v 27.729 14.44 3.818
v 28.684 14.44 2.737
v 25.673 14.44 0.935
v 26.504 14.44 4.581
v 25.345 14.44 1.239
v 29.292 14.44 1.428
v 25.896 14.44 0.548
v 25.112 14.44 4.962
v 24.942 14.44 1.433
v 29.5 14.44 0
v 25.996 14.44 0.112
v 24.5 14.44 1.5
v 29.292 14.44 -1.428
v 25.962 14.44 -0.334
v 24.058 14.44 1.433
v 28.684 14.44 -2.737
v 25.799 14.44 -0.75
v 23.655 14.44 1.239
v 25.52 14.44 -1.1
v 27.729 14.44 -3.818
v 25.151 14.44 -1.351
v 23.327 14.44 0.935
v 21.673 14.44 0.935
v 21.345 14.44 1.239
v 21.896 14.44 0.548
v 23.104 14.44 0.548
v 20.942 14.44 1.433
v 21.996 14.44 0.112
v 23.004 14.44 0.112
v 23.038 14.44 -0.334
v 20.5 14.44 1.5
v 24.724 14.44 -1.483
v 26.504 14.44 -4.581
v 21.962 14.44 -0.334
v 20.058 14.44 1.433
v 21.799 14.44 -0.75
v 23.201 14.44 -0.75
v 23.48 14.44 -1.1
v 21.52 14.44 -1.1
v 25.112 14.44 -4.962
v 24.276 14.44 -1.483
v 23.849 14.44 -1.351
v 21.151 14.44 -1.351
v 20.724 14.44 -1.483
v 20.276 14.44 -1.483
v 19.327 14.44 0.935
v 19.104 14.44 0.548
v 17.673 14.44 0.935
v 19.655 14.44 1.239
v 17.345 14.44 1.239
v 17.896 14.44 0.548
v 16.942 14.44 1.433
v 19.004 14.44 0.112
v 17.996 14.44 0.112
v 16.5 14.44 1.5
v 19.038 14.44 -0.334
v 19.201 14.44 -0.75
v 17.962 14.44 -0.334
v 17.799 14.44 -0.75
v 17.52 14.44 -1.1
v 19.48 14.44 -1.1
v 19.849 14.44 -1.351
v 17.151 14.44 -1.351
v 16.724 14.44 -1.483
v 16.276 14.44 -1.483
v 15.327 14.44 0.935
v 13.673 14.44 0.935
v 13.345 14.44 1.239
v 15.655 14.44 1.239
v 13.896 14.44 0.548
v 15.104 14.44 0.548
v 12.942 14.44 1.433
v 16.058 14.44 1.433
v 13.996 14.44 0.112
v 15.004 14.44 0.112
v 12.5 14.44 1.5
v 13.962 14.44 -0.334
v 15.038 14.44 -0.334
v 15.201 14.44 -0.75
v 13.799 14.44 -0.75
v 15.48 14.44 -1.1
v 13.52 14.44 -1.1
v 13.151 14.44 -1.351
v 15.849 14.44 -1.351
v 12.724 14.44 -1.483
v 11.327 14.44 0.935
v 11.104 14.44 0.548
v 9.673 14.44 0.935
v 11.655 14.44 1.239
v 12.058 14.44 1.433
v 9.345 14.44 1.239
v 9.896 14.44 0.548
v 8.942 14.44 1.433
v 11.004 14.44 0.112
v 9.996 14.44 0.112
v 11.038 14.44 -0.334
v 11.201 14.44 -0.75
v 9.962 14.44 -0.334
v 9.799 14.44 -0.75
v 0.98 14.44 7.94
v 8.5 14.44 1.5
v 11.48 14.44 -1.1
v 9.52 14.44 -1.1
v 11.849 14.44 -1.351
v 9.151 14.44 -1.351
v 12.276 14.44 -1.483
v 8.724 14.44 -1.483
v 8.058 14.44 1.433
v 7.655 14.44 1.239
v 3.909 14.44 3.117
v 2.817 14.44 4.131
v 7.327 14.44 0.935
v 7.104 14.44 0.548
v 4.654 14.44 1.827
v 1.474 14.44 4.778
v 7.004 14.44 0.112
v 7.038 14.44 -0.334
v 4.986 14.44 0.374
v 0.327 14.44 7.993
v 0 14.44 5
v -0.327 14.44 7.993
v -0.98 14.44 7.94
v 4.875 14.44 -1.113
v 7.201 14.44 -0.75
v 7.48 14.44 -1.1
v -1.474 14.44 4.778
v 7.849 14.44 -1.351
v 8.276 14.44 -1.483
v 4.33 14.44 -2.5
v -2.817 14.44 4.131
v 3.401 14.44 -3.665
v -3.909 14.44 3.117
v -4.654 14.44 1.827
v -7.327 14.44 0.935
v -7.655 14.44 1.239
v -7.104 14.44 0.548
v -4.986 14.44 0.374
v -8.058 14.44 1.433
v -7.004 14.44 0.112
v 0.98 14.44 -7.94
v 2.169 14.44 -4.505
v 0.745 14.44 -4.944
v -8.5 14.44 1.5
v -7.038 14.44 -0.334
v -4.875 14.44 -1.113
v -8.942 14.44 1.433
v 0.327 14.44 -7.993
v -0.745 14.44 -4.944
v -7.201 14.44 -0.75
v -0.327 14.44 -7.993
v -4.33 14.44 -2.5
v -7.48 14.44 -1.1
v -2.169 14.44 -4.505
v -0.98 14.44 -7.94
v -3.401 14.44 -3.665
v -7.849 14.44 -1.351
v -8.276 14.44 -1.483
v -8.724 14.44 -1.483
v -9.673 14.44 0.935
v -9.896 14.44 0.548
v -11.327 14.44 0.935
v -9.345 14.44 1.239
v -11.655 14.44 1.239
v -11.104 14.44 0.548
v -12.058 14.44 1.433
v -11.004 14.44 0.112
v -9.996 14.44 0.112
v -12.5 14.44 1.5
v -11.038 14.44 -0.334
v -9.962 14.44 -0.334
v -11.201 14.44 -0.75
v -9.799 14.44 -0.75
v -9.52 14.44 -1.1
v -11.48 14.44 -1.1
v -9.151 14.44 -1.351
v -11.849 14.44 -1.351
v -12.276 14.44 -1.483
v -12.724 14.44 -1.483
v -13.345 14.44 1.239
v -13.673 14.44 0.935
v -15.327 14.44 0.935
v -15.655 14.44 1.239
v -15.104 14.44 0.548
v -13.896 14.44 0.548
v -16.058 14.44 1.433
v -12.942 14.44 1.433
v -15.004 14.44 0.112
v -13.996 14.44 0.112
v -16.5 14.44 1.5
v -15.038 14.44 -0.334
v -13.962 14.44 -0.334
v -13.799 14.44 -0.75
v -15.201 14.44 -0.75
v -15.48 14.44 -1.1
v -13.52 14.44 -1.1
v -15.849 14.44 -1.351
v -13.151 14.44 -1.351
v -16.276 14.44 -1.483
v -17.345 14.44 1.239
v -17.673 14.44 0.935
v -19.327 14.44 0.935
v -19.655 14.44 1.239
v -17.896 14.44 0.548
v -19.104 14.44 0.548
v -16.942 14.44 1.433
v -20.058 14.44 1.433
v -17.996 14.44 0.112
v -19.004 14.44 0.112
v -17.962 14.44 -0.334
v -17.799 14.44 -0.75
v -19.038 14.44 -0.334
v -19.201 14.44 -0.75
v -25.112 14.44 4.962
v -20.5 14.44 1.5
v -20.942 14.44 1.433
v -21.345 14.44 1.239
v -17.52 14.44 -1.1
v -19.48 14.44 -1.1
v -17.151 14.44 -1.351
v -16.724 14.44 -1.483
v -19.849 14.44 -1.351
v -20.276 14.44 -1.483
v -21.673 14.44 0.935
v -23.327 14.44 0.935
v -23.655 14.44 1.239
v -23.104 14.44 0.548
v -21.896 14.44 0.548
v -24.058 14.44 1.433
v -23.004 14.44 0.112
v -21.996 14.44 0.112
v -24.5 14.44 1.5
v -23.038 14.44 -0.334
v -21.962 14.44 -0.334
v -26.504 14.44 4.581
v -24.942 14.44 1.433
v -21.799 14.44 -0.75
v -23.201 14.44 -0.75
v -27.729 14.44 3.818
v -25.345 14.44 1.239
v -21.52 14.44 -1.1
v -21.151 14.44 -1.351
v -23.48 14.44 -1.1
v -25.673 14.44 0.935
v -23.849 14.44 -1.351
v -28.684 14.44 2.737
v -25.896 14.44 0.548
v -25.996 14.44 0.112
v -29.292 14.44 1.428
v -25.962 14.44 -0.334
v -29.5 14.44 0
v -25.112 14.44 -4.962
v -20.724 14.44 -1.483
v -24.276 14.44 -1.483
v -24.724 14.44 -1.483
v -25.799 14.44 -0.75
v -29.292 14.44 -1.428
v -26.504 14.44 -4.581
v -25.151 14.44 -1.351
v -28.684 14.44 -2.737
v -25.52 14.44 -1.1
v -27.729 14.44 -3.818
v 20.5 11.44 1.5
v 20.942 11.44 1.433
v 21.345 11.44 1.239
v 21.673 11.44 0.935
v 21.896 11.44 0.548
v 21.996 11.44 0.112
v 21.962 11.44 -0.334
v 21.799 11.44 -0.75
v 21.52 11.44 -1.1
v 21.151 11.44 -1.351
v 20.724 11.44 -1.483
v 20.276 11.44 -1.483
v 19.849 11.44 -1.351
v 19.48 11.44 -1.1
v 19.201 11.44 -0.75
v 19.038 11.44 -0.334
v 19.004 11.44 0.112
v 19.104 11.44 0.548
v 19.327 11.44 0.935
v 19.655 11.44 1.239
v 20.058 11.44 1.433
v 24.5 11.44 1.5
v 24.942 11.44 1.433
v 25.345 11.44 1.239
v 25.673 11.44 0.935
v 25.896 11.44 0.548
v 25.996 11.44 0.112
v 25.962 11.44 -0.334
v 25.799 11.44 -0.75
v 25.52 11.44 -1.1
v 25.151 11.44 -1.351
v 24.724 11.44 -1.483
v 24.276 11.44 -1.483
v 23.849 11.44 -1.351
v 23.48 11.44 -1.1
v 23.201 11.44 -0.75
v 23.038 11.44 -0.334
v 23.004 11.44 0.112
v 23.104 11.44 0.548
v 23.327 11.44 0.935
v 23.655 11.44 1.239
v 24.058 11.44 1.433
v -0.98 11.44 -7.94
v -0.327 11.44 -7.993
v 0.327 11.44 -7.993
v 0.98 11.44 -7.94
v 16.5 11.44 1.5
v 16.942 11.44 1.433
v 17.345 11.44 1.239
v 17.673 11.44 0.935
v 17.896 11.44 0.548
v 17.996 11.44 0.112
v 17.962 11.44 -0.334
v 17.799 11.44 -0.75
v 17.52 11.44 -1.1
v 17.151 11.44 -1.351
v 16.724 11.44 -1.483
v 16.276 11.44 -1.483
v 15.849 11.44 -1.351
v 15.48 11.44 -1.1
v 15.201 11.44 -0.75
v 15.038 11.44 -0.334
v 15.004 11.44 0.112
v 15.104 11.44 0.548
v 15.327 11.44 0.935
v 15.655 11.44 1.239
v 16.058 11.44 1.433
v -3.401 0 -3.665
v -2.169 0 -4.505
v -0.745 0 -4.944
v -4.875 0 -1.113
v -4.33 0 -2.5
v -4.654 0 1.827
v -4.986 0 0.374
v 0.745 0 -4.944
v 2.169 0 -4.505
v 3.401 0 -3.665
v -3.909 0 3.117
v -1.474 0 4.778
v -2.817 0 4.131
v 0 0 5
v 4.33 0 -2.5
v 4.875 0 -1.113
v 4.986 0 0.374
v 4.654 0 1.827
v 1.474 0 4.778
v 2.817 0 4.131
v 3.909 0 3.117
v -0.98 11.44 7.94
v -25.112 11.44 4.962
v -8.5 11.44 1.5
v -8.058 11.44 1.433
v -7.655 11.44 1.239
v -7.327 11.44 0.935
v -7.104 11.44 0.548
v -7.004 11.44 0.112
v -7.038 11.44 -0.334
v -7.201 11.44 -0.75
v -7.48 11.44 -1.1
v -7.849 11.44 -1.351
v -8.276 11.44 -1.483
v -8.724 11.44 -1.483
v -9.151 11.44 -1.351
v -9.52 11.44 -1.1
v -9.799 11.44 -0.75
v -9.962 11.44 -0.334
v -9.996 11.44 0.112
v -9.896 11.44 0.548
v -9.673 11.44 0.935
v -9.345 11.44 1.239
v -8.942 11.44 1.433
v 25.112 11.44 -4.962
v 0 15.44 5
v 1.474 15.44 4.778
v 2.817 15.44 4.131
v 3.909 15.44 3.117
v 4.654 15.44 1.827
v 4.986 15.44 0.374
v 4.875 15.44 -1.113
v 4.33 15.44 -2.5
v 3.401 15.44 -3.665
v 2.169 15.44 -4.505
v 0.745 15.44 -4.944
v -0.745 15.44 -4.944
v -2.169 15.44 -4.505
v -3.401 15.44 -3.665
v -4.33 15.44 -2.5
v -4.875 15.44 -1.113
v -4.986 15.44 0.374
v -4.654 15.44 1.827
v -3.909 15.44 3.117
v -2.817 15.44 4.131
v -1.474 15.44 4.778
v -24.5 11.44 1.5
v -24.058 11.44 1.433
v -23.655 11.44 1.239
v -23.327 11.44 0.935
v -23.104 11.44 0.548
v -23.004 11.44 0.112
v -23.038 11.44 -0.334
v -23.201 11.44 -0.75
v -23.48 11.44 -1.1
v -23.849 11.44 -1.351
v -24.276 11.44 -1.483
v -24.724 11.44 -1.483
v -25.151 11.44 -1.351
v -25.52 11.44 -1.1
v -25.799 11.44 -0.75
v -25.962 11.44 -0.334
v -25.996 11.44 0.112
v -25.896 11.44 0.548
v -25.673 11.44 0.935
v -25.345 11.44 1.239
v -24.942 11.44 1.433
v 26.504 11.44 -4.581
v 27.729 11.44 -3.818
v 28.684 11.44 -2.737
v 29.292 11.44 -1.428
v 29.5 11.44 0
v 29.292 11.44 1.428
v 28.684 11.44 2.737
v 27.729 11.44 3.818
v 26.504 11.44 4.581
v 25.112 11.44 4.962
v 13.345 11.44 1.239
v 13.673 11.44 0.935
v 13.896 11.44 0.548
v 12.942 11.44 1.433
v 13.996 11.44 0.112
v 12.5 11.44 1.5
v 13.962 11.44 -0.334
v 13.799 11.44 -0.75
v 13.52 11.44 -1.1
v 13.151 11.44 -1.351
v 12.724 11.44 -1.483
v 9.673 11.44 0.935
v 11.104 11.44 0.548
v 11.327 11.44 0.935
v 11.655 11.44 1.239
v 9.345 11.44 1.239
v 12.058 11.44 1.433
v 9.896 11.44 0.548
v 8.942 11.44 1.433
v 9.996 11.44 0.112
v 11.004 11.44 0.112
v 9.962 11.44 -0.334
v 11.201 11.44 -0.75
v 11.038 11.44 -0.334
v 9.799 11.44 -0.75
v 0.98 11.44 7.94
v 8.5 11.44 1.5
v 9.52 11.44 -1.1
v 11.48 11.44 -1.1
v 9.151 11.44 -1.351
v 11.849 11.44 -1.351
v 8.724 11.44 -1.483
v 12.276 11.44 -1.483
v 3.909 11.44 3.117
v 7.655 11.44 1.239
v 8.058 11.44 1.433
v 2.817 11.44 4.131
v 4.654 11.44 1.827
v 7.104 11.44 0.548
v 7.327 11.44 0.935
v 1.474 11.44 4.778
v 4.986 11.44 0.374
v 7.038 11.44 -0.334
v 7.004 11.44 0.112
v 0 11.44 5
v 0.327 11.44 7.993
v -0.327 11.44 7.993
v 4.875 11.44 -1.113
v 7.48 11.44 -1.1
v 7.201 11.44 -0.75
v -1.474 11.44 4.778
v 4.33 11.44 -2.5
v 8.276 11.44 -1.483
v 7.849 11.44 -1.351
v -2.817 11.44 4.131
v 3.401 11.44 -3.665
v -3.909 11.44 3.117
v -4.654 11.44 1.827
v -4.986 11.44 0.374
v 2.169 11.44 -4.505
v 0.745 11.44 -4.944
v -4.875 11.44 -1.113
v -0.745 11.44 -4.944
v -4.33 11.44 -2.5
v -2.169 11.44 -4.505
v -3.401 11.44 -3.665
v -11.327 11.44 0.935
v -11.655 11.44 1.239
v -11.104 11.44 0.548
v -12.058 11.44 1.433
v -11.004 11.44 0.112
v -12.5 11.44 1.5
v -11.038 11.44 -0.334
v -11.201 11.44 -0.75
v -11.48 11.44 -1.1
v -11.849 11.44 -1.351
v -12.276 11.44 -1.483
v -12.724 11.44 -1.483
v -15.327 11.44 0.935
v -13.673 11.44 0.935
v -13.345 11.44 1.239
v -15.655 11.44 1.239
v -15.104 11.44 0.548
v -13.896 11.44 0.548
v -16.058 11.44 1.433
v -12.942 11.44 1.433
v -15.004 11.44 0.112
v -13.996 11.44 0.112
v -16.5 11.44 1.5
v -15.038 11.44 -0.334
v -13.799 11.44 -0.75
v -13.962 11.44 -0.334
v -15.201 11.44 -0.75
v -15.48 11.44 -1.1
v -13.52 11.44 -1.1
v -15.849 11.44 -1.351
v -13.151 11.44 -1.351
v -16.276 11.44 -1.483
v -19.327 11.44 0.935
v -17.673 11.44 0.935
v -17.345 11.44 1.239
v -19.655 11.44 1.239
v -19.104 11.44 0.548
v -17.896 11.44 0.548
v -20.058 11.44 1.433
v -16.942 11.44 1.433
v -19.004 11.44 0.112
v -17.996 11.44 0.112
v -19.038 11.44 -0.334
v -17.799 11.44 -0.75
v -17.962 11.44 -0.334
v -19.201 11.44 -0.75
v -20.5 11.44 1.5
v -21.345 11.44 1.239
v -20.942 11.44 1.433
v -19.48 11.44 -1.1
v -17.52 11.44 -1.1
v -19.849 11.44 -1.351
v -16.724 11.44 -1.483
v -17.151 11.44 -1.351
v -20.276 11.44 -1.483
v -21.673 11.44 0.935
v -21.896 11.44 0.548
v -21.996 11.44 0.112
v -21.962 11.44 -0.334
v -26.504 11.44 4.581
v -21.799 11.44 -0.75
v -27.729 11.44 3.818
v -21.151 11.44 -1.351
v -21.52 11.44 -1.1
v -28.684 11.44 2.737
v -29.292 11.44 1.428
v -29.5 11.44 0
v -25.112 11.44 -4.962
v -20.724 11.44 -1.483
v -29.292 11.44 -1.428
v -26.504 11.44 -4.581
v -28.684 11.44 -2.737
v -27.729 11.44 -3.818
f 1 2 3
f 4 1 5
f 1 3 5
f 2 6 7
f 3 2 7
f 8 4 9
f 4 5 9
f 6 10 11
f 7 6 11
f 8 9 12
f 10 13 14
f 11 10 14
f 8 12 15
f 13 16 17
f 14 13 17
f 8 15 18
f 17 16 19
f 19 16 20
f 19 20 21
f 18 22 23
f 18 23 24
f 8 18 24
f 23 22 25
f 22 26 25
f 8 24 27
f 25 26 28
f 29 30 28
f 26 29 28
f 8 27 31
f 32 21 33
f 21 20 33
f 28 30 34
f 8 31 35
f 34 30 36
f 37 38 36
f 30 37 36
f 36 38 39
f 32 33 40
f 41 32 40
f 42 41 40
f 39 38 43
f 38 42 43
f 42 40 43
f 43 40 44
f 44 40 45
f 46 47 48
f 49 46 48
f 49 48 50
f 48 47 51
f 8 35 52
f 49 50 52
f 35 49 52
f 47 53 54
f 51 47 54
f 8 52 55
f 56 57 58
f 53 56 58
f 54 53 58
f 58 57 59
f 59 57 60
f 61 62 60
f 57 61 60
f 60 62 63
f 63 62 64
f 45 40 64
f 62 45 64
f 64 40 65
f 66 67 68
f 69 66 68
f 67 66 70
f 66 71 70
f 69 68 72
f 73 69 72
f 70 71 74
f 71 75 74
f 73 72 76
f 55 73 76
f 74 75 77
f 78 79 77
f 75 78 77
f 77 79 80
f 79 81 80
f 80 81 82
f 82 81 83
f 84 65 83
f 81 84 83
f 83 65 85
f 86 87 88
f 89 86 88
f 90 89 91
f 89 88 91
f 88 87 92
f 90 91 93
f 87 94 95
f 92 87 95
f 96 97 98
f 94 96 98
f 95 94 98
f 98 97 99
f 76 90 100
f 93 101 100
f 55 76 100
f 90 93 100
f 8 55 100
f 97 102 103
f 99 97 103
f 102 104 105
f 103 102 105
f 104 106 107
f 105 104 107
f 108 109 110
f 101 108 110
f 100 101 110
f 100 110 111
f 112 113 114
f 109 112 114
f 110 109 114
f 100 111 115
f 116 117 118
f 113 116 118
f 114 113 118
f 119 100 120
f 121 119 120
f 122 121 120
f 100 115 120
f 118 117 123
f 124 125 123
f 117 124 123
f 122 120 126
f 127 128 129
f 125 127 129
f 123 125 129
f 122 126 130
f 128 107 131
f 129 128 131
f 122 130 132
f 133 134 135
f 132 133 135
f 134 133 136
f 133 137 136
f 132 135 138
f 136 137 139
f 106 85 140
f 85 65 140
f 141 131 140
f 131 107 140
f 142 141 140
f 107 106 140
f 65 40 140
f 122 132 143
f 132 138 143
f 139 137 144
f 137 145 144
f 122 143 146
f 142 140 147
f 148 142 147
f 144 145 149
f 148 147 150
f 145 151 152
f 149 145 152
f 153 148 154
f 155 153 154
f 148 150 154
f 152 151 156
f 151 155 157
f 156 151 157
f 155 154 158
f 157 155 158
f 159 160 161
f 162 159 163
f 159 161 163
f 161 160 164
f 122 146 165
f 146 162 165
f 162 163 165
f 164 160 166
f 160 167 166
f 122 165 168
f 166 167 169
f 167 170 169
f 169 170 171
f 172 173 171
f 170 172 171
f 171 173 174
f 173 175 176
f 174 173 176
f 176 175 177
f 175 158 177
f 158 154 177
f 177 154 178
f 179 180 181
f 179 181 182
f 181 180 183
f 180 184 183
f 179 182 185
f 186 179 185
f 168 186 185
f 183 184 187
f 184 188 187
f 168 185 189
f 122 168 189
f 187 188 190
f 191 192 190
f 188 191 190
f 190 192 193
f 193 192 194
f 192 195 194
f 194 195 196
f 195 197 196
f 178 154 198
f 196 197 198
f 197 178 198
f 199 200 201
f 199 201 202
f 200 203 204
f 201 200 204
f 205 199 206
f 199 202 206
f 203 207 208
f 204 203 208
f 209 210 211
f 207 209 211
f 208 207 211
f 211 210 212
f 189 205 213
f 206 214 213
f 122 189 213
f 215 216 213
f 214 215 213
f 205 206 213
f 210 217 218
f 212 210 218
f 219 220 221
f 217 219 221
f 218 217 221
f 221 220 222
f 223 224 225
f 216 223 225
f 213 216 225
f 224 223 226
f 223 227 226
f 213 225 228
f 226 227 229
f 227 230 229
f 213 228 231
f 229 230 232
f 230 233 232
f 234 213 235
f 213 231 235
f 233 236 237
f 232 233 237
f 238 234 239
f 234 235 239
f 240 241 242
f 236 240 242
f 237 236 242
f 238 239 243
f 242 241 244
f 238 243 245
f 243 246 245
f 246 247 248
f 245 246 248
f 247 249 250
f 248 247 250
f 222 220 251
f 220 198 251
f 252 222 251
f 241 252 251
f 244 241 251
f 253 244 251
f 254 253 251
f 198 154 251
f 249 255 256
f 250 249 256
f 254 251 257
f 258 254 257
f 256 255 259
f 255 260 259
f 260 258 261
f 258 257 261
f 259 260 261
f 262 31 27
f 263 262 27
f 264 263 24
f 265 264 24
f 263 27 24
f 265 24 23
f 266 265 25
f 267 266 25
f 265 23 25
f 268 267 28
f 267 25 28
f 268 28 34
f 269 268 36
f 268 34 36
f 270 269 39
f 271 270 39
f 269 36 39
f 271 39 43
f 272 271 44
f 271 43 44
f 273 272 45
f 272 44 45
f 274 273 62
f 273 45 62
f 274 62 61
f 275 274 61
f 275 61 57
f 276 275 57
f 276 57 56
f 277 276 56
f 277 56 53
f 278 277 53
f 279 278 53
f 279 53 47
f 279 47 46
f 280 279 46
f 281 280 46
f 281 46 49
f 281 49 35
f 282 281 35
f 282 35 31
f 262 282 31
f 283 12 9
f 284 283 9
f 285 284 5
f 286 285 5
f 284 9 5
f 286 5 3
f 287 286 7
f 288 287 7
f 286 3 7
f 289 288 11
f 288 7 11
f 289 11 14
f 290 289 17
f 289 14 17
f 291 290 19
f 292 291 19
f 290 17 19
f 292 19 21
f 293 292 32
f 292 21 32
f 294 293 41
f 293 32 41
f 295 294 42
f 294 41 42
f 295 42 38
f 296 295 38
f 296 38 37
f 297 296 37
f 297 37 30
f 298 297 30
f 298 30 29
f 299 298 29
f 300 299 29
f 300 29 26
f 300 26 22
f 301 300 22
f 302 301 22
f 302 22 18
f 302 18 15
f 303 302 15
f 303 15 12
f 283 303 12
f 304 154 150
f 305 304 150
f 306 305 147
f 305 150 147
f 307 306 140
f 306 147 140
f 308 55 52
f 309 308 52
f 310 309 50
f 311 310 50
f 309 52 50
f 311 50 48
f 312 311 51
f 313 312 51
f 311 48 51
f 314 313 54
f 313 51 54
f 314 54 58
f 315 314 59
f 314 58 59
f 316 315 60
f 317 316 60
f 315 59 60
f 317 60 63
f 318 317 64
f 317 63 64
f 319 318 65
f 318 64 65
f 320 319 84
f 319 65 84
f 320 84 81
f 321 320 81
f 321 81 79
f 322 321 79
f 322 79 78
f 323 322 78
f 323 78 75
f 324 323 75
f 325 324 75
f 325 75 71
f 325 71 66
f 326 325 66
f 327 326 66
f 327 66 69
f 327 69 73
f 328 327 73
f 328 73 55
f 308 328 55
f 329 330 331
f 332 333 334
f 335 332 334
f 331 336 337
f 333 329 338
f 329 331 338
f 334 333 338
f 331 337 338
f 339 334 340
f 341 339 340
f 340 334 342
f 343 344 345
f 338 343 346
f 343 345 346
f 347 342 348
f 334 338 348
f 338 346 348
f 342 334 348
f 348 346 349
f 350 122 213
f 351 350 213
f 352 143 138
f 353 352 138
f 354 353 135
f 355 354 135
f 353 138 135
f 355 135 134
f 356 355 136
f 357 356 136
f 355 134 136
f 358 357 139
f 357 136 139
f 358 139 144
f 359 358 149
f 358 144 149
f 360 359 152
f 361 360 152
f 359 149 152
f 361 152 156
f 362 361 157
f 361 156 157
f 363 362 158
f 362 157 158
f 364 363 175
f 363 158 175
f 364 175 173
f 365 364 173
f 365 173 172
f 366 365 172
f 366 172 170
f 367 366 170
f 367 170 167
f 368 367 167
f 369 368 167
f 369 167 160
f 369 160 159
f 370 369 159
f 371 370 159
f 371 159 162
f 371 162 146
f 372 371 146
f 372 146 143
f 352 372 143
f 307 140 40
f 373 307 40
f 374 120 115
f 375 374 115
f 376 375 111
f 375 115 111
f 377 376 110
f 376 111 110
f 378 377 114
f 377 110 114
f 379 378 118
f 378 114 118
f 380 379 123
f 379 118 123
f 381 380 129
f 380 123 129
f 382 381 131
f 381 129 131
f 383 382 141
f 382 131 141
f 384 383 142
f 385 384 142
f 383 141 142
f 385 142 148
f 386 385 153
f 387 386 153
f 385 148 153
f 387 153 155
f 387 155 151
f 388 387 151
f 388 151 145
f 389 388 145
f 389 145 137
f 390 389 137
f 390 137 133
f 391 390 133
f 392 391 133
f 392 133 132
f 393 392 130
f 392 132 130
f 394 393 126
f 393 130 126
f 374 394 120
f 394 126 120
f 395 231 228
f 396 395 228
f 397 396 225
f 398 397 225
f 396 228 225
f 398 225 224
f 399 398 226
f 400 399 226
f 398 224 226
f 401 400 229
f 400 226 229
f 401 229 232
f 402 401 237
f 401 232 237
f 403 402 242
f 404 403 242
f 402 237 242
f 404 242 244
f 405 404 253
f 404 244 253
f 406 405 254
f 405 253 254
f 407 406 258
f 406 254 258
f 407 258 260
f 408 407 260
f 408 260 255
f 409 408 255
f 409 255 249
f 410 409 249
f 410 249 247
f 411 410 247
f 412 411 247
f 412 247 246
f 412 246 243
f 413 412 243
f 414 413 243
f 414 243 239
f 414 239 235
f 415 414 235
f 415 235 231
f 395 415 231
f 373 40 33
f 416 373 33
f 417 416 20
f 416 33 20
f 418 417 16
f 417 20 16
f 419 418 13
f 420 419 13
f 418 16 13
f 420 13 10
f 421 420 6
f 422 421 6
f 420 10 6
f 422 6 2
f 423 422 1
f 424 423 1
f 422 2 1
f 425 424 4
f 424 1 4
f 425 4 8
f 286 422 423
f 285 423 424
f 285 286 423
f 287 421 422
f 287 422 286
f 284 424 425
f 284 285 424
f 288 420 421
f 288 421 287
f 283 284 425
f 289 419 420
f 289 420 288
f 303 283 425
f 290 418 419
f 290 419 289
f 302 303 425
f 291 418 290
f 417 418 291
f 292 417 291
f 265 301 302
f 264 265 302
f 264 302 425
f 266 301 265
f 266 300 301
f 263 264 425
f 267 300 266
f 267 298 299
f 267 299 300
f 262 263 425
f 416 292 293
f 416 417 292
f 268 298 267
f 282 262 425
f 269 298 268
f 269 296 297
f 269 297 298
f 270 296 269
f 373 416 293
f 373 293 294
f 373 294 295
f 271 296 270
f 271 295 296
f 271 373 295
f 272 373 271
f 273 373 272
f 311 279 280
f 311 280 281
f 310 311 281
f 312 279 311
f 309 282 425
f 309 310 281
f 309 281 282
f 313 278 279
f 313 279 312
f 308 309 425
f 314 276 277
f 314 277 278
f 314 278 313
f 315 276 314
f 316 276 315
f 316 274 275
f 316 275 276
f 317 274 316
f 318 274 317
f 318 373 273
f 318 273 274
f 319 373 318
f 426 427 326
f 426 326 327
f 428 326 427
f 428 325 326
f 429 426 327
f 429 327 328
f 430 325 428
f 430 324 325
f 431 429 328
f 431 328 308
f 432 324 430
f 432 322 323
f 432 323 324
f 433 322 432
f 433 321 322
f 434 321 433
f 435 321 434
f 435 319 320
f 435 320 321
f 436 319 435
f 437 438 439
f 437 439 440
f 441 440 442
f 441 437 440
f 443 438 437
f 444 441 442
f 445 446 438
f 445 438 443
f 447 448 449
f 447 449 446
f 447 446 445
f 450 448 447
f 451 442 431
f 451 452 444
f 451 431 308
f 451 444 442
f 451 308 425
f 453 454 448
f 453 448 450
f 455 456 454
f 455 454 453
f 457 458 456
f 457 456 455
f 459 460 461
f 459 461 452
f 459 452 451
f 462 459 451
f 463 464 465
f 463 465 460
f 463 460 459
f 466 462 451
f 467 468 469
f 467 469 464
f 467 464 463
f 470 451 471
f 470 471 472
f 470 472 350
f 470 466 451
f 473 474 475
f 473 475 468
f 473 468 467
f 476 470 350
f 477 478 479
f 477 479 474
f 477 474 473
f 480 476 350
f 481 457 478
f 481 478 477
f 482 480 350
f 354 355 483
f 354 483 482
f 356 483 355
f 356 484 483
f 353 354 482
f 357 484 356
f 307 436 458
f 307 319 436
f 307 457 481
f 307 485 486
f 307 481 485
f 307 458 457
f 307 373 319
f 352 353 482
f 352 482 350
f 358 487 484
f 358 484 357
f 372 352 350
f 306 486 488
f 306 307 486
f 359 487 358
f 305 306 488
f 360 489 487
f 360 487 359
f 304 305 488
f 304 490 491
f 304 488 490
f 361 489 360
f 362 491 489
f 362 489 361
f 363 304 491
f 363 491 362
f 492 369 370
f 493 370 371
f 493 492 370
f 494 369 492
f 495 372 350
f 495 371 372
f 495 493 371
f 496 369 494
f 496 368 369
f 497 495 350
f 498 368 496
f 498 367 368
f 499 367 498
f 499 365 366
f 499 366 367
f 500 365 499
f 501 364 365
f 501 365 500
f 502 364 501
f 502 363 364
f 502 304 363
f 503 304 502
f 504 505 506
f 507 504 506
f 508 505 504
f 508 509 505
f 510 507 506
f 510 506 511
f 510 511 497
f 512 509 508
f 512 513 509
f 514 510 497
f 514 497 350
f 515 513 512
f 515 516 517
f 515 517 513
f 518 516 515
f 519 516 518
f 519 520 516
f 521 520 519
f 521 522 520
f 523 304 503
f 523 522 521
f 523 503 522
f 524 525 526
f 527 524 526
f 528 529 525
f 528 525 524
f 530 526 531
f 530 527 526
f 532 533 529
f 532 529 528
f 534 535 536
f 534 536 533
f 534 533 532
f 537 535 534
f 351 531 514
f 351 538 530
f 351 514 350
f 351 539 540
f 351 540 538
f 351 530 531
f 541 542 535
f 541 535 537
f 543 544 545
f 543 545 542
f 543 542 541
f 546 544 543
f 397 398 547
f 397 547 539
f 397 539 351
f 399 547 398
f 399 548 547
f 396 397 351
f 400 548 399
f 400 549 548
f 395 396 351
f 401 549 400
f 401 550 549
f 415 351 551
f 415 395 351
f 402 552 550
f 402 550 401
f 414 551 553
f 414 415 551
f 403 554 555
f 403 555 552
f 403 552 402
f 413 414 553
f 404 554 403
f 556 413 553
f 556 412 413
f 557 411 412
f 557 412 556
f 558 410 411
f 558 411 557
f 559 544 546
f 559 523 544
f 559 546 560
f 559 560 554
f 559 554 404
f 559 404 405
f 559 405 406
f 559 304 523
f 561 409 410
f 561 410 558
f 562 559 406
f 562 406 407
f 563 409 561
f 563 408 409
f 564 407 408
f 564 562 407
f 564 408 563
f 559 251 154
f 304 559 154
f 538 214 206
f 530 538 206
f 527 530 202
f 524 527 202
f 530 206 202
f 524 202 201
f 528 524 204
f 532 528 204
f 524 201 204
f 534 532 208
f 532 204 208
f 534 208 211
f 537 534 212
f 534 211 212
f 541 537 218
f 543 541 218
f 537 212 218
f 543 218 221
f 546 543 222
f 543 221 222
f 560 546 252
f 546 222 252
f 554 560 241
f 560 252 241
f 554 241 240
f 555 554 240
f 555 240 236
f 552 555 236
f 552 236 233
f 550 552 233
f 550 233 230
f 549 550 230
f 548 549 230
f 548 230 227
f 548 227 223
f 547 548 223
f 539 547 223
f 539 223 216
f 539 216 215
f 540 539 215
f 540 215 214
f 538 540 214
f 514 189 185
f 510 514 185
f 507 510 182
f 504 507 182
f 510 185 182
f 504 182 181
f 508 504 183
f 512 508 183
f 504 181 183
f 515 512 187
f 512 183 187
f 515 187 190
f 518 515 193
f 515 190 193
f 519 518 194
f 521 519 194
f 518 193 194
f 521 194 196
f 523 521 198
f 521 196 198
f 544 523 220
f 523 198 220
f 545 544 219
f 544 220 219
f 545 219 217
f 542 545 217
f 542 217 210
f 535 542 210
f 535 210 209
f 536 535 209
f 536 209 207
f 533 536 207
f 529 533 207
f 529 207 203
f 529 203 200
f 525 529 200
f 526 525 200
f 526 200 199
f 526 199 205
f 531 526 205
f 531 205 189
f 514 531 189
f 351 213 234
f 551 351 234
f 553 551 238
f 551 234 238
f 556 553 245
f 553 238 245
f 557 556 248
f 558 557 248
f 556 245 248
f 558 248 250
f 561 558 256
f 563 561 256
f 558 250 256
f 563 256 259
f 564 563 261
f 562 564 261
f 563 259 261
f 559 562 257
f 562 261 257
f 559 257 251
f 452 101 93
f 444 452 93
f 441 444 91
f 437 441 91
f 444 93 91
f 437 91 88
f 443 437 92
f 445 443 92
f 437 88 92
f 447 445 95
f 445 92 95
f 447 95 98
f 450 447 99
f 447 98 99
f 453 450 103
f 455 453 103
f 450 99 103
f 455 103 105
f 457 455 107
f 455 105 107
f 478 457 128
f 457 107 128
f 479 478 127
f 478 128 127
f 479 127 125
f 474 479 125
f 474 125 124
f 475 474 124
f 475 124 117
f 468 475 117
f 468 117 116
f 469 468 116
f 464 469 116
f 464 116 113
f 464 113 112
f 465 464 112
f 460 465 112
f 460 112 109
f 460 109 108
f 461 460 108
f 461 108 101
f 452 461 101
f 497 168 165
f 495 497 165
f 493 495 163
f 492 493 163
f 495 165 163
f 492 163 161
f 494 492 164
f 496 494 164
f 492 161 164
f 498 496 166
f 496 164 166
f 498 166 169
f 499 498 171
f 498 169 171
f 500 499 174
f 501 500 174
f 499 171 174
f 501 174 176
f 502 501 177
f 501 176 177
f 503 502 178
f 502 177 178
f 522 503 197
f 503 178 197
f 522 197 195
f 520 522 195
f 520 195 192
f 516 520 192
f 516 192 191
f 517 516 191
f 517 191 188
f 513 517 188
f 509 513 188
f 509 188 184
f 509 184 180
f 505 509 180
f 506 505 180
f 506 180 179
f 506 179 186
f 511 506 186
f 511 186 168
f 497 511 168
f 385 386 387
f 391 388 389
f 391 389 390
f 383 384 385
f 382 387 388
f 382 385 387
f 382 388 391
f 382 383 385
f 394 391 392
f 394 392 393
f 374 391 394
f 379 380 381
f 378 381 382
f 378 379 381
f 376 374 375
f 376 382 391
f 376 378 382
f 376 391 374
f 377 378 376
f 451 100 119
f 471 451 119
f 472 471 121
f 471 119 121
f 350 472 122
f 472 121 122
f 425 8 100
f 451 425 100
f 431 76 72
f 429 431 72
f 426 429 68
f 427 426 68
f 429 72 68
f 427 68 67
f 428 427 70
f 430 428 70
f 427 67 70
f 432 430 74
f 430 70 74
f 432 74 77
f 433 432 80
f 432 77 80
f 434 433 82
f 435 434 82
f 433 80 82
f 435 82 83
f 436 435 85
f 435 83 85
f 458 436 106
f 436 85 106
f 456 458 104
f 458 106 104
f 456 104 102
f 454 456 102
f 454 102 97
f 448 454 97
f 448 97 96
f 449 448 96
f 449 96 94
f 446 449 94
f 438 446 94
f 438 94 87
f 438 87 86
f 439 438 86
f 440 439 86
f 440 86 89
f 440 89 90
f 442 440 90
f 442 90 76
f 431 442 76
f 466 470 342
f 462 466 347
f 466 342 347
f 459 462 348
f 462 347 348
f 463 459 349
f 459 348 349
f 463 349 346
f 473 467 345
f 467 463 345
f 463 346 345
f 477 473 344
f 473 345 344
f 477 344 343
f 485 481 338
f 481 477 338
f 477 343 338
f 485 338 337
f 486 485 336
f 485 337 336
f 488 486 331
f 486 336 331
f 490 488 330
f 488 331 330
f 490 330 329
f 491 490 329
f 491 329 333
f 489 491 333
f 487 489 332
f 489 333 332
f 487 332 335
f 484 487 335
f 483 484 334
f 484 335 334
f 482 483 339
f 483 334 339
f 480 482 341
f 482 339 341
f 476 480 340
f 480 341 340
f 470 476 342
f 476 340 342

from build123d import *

# Parameters (mm, degrees)
SKETCH2_R           = 5
BOSS_EXTRUDE1_DEPTH = 8.44
SKETCH3_R           = 5
BOSS_EXTRUDE2_DEPTH = 6
BOSS_EXTRUDE3_DEPTH = 3
CUT_EXTRUDE1_REACH  = 35.805
SKETCH5_R           = 1.5
SKETCH6_R           = 5
BOSS_EXTRUDE4_DEPTH = 1


with BuildPart() as part:
    # Sketch2 → Boss-Extrude1 (new body)
    with BuildSketch(Plane(origin=(0, 0, 0), x_dir=(1, 0, 0), z_dir=(0, 1, 0))):
        with Locations(Location((0, 0, 0), (0, 0, 270))):
            Circle(SKETCH2_R)
    extrude(amount=BOSS_EXTRUDE1_DEPTH)

    # Sketch3 → Boss-Extrude2 (add)
    with BuildSketch(Plane(origin=(0, 8.44, 0), x_dir=(1, 0, 0), z_dir=(0, 1, 0))):
        with Locations(Location((0, 0, 0), (0, 0, 270))):
            Circle(SKETCH3_R)
    extrude(amount=BOSS_EXTRUDE2_DEPTH)

    # Sketch4 → Boss-Extrude3 (add)
    with BuildSketch(Plane(origin=(0, 14.44, 0), x_dir=(1, 0, 0), z_dir=(0, 1, 0))):
        with BuildLine():
            Line((-0.979591837, -7.939798476), (-25.112244898, -4.962374047))
            ThreePointArc((-25.112244898, -4.962374047), (-29.5, 0), (-25.112244898, 4.962374047))
            Line((-25.112244898, 4.962374047), (-0.979591837, 7.939798476))
            ThreePointArc((-0.979591837, 7.939798476), (0, 8), (0.979591837, 7.939798476))
            Line((0.979591837, 7.939798476), (25.112244898, 4.962374047))
            ThreePointArc((25.112244898, 4.962374047), (29.5, 0), (25.112244898, -4.962374047))
            Line((25.112244898, -4.962374047), (0.979591837, -7.939798476))
            ThreePointArc((0.979591837, -7.939798476), (0, -8), (-0.979591837, -7.939798476))
        make_face()
    extrude(amount=-BOSS_EXTRUDE3_DEPTH)

    # Sketch5 → Cut-Extrude1 (cut, up to next)
    with BuildSketch(Plane(origin=(0, 14.44, 0), x_dir=(1, 0, 0), z_dir=(0, 1, 0)), mode=Mode.PRIVATE) as cut_extrude1_sk1:
        with Locations(Location((24.5, 0, 0), (0, 0, 270))):
            Circle(SKETCH5_R)
    cut_extrude1_tool1 = extrude(cut_extrude1_sk1.sketch, amount=-CUT_EXTRUDE1_REACH, mode=Mode.PRIVATE) & part.part
    # Sketch5 → Cut-Extrude1 (cut, up to next)
    with BuildSketch(Plane(origin=(0, 14.44, 0), x_dir=(1, 0, 0), z_dir=(0, 1, 0)), mode=Mode.PRIVATE) as cut_extrude1_sk2:
        with Locations(Location((20.5, 0, 0), (0, 0, 270))):
            Circle(SKETCH5_R)
    cut_extrude1_tool2 = extrude(cut_extrude1_sk2.sketch, amount=-CUT_EXTRUDE1_REACH, mode=Mode.PRIVATE) & part.part
    # Sketch5 → Cut-Extrude1 (cut, up to next)
    with BuildSketch(Plane(origin=(0, 14.44, 0), x_dir=(1, 0, 0), z_dir=(0, 1, 0)), mode=Mode.PRIVATE) as cut_extrude1_sk3:
        with Locations(Location((16.5, 0, 0), (0, 0, 270))):
            Circle(SKETCH5_R)
    cut_extrude1_tool3 = extrude(cut_extrude1_sk3.sketch, amount=-CUT_EXTRUDE1_REACH, mode=Mode.PRIVATE) & part.part
    # Sketch5 → Cut-Extrude1 (cut, up to next)
    with BuildSketch(Plane(origin=(0, 14.44, 0), x_dir=(1, 0, 0), z_dir=(0, 1, 0)), mode=Mode.PRIVATE) as cut_extrude1_sk4:
        with Locations(Location((12.5, 0, 0), (0, 0, 270))):
            Circle(SKETCH5_R)
    cut_extrude1_tool4 = extrude(cut_extrude1_sk4.sketch, amount=-CUT_EXTRUDE1_REACH, mode=Mode.PRIVATE) & part.part
    # Sketch5 → Cut-Extrude1 (cut, up to next)
    with BuildSketch(Plane(origin=(0, 14.44, 0), x_dir=(1, 0, 0), z_dir=(0, 1, 0)), mode=Mode.PRIVATE) as cut_extrude1_sk5:
        with Locations(Location((8.5, 0, 0), (0, 0, 270))):
            Circle(SKETCH5_R)
    cut_extrude1_tool5 = extrude(cut_extrude1_sk5.sketch, amount=-CUT_EXTRUDE1_REACH, mode=Mode.PRIVATE) & part.part
    # Sketch5 → Cut-Extrude1 (cut, up to next)
    with BuildSketch(Plane(origin=(0, 14.44, 0), x_dir=(1, 0, 0), z_dir=(0, 1, 0)), mode=Mode.PRIVATE) as cut_extrude1_sk6:
        with Locations(Location((-24.5, 0, 0), (0, 0, 270))):
            Circle(SKETCH5_R)
    cut_extrude1_tool6 = extrude(cut_extrude1_sk6.sketch, amount=-CUT_EXTRUDE1_REACH, mode=Mode.PRIVATE) & part.part
    # Sketch5 → Cut-Extrude1 (cut, up to next)
    with BuildSketch(Plane(origin=(0, 14.44, 0), x_dir=(1, 0, 0), z_dir=(0, 1, 0)), mode=Mode.PRIVATE) as cut_extrude1_sk7:
        with Locations(Location((-8.5, 0, 0), (0, 0, 270))):
            Circle(SKETCH5_R)
    cut_extrude1_tool7 = extrude(cut_extrude1_sk7.sketch, amount=-CUT_EXTRUDE1_REACH, mode=Mode.PRIVATE) & part.part
    # Sketch5 → Cut-Extrude1 (cut, up to next)
    with BuildSketch(Plane(origin=(0, 14.44, 0), x_dir=(1, 0, 0), z_dir=(0, 1, 0)), mode=Mode.PRIVATE) as cut_extrude1_sk8:
        with Locations(Location((-12.5, 0, 0), (0, 0, 270))):
            Circle(SKETCH5_R)
    cut_extrude1_tool8 = extrude(cut_extrude1_sk8.sketch, amount=-CUT_EXTRUDE1_REACH, mode=Mode.PRIVATE) & part.part
    # Sketch5 → Cut-Extrude1 (cut, up to next)
    with BuildSketch(Plane(origin=(0, 14.44, 0), x_dir=(1, 0, 0), z_dir=(0, 1, 0)), mode=Mode.PRIVATE) as cut_extrude1_sk9:
        with Locations(Location((-16.5, 0, 0), (0, 0, 270))):
            Circle(SKETCH5_R)
    cut_extrude1_tool9 = extrude(cut_extrude1_sk9.sketch, amount=-CUT_EXTRUDE1_REACH, mode=Mode.PRIVATE) & part.part
    # Sketch5 → Cut-Extrude1 (cut, up to next)
    with BuildSketch(Plane(origin=(0, 14.44, 0), x_dir=(1, 0, 0), z_dir=(0, 1, 0)), mode=Mode.PRIVATE) as cut_extrude1_sk10:
        with Locations(Location((-20.5, 0, 0), (0, 0, 270))):
            Circle(SKETCH5_R)
    cut_extrude1_tool10 = extrude(cut_extrude1_sk10.sketch, amount=-CUT_EXTRUDE1_REACH, mode=Mode.PRIVATE) & part.part
    add(cut_extrude1_tool1.solids().sort_by_distance((24.5, 14.44, 0))[0], mode=Mode.SUBTRACT)
    add(cut_extrude1_tool2.solids().sort_by_distance((20.5, 14.44, 0))[0], mode=Mode.SUBTRACT)
    add(cut_extrude1_tool3.solids().sort_by_distance((16.5, 14.44, 0))[0], mode=Mode.SUBTRACT)
    add(cut_extrude1_tool4.solids().sort_by_distance((12.5, 14.44, 0))[0], mode=Mode.SUBTRACT)
    add(cut_extrude1_tool5.solids().sort_by_distance((8.5, 14.44, 0))[0], mode=Mode.SUBTRACT)
    add(cut_extrude1_tool6.solids().sort_by_distance((-24.5, 14.44, 0))[0], mode=Mode.SUBTRACT)
    add(cut_extrude1_tool7.solids().sort_by_distance((-8.5, 14.44, 0))[0], mode=Mode.SUBTRACT)
    add(cut_extrude1_tool8.solids().sort_by_distance((-12.5, 14.44, 0))[0], mode=Mode.SUBTRACT)
    add(cut_extrude1_tool9.solids().sort_by_distance((-16.5, 14.44, 0))[0], mode=Mode.SUBTRACT)
    add(cut_extrude1_tool10.solids().sort_by_distance((-20.5, 14.44, 0))[0], mode=Mode.SUBTRACT)

    # Sketch6 → Boss-Extrude4 (add)
    with BuildSketch(Plane(origin=(0, 14.44, 0), x_dir=(1, 0, 0), z_dir=(0, 1, 0))):
        with Locations(Location((0, 0, 0), (0, 0, 270))):
            Circle(SKETCH6_R)
    extrude(amount=BOSS_EXTRUDE4_DEPTH)


solid = part.part
